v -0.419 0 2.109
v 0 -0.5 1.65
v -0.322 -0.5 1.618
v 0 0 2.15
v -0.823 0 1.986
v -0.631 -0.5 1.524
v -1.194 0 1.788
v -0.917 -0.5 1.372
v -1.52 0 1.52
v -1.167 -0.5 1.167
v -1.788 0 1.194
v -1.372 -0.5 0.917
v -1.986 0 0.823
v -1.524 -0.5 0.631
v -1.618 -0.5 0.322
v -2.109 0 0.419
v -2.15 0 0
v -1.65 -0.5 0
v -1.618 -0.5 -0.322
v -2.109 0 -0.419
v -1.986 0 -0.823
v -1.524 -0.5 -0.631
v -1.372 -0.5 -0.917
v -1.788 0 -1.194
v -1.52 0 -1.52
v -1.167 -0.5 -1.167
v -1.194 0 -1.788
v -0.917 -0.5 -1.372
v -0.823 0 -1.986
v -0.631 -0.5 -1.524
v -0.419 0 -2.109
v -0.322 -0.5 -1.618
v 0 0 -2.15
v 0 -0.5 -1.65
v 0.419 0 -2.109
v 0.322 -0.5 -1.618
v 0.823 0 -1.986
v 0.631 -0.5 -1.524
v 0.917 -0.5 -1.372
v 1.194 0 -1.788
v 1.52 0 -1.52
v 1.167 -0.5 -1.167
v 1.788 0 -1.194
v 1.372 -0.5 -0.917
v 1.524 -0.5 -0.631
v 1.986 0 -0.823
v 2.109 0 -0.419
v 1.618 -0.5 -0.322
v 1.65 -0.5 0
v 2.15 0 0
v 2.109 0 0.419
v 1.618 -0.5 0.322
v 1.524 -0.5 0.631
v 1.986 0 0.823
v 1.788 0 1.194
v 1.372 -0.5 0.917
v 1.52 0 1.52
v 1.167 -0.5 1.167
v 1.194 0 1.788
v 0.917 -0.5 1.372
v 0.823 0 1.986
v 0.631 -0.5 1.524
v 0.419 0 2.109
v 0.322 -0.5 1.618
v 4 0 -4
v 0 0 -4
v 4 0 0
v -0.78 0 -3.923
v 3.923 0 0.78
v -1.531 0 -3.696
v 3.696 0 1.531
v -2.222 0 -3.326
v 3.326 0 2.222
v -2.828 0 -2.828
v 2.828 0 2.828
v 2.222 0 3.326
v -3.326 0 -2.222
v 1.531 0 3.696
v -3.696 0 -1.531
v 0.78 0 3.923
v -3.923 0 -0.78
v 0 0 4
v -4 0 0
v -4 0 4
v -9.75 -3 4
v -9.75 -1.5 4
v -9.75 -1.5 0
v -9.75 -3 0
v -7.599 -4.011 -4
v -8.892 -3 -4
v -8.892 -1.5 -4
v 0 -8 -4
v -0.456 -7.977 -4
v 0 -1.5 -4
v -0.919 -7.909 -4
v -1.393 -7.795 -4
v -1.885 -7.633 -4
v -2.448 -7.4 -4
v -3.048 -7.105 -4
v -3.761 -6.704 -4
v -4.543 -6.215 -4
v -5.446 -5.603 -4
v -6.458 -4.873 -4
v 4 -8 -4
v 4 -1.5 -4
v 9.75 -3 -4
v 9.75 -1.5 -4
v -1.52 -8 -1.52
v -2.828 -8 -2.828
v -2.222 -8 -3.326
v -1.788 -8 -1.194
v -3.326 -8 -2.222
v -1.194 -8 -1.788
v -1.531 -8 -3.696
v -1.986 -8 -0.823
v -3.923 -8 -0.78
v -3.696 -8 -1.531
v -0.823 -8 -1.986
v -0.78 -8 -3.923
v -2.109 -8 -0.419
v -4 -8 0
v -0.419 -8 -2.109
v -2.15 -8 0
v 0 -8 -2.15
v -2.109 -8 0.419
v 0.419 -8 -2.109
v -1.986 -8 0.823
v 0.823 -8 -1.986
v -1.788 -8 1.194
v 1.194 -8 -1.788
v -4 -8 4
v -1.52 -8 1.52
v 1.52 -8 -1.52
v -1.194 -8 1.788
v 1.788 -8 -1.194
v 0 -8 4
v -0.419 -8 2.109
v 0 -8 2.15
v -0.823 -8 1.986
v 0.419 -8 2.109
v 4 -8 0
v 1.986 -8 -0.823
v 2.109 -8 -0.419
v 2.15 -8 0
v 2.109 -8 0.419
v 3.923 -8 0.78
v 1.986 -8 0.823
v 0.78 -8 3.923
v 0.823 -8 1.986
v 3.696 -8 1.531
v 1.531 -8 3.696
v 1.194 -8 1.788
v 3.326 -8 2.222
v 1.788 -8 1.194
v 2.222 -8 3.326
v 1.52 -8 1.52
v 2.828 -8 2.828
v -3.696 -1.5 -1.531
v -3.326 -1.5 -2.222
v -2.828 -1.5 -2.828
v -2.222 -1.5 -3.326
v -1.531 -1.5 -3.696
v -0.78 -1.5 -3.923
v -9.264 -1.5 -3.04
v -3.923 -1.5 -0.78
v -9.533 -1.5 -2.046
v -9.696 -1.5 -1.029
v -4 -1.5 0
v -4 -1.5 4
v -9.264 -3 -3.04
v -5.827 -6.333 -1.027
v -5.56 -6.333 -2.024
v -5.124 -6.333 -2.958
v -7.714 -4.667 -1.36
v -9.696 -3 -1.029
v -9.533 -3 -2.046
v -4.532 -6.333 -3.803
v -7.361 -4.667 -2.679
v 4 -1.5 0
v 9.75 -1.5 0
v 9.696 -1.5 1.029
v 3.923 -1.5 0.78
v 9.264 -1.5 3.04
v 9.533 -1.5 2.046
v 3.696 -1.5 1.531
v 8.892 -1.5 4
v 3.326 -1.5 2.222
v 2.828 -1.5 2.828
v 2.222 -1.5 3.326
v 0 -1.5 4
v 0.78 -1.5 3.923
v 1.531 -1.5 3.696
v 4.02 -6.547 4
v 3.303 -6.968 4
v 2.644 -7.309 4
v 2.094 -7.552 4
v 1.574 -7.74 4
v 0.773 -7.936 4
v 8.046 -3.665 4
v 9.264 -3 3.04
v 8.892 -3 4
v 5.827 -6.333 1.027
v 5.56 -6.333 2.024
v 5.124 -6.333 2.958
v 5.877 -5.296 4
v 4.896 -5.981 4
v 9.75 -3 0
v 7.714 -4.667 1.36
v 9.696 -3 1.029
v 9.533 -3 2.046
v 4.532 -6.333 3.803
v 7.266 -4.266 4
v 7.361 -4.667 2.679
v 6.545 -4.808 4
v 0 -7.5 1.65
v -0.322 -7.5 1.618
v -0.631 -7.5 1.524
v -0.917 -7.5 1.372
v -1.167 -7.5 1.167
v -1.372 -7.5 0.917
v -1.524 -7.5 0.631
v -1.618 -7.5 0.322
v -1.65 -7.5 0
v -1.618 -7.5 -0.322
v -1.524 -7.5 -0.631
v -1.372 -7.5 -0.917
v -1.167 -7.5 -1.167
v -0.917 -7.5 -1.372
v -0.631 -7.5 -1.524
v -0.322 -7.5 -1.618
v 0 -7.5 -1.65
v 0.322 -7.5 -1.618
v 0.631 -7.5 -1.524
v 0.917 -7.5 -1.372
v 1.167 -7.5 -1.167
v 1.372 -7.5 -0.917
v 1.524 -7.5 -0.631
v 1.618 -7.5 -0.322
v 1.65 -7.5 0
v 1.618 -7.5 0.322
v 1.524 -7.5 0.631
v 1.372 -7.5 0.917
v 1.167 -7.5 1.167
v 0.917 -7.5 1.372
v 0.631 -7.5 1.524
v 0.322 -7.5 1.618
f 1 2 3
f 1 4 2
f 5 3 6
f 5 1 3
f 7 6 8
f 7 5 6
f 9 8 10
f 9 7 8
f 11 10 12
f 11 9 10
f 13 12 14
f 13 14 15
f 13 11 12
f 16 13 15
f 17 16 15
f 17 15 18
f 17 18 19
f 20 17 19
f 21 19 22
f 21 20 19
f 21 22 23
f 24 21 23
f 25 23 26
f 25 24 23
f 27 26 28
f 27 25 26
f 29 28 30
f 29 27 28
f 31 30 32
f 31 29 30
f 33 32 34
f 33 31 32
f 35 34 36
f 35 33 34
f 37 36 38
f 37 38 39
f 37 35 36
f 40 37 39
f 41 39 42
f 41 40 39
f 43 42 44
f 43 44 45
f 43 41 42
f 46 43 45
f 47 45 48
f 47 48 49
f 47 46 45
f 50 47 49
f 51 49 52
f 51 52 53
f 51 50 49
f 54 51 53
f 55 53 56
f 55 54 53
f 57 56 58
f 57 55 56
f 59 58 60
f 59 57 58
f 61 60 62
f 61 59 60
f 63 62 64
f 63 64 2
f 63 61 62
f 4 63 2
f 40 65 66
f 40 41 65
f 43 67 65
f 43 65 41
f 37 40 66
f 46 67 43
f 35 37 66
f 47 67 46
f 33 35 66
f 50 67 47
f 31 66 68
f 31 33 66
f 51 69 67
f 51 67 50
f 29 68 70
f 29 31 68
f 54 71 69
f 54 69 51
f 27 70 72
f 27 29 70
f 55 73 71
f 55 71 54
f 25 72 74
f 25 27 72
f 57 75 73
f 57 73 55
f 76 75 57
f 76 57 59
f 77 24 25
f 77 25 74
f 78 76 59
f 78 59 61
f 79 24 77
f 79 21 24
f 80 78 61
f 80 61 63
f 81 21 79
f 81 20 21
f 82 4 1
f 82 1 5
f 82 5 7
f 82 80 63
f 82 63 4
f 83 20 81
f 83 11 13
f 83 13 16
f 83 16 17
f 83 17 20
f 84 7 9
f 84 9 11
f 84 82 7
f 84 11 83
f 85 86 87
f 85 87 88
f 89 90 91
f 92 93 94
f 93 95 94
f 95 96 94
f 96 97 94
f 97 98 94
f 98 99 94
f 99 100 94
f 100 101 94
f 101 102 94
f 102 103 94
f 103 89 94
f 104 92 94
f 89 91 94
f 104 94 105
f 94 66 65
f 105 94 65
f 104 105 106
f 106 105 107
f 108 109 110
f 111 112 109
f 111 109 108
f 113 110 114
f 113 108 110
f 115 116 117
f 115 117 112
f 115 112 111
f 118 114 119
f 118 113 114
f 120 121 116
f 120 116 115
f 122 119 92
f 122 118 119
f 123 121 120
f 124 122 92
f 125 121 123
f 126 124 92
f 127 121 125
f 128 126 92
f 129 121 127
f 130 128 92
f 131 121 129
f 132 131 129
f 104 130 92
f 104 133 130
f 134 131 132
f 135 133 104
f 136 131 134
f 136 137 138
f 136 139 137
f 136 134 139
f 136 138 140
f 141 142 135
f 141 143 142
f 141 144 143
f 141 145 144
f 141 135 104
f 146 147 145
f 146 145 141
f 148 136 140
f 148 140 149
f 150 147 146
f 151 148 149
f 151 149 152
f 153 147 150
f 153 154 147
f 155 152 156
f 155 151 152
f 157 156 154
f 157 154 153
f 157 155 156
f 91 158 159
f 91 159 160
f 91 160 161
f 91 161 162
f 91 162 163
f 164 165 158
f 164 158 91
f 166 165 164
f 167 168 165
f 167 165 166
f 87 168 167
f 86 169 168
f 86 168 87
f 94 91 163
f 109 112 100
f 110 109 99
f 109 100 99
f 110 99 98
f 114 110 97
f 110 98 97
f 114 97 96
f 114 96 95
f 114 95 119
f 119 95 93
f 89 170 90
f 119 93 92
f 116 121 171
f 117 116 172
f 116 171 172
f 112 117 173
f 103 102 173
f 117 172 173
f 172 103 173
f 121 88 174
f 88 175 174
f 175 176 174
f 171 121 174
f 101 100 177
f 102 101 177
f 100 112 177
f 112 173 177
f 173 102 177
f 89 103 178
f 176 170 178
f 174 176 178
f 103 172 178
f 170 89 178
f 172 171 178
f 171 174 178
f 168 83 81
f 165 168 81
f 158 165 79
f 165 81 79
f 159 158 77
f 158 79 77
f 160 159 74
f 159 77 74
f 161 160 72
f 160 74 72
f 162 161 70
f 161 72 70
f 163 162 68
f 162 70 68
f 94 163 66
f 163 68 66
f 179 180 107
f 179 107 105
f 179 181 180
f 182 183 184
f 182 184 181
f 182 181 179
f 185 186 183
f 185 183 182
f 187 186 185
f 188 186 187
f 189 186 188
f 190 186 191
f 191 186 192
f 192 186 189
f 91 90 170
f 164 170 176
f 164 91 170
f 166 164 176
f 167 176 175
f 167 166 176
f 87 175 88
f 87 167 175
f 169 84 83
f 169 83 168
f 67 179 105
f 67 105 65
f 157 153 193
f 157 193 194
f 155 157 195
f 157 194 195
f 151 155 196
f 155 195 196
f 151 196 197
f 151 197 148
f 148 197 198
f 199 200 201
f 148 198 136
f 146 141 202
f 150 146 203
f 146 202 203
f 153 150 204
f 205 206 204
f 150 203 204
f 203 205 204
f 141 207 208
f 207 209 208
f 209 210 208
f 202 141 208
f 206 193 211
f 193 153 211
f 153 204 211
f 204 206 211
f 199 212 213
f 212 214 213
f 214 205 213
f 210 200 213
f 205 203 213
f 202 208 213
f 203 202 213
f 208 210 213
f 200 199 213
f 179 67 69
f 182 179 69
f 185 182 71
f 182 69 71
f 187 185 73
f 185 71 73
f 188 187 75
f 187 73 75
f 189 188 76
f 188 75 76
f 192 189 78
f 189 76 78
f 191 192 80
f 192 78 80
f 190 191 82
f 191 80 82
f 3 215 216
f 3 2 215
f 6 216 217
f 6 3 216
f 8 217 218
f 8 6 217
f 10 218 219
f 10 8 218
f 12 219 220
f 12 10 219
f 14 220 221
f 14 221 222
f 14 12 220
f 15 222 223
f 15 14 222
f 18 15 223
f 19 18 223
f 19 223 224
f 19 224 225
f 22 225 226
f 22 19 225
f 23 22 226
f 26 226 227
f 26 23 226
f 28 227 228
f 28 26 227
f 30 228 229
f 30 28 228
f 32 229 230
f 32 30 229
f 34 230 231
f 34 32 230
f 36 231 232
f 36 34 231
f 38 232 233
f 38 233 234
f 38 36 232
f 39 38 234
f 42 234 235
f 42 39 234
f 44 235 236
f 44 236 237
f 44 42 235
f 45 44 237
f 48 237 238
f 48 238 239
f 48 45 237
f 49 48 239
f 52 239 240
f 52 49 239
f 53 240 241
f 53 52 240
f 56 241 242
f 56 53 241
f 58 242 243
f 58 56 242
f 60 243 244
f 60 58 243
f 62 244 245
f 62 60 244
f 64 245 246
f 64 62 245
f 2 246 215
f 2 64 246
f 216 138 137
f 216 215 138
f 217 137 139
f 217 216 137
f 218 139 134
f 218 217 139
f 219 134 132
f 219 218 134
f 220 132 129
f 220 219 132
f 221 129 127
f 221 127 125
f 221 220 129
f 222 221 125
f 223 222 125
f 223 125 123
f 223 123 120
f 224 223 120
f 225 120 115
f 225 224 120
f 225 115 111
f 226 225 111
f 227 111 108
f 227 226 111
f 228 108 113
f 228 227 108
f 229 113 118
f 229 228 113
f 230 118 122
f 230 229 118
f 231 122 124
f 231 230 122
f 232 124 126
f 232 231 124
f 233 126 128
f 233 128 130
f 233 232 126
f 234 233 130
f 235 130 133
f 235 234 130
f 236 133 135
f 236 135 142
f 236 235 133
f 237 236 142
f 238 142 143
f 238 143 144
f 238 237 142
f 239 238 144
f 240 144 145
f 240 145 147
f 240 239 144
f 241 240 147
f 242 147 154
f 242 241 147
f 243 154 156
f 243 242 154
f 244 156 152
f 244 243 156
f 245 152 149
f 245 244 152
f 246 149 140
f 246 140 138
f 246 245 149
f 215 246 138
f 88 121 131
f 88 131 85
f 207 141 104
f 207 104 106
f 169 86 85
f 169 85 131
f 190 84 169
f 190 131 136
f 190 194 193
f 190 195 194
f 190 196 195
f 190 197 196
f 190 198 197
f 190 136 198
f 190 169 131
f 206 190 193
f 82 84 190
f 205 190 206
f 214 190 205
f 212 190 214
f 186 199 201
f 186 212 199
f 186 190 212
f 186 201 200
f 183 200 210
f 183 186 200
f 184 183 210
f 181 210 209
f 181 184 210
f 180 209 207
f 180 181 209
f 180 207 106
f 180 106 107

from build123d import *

# Parameters (mm, degrees)
EXTRUDE_1_DEPTH     = 4
CUT_EXTRUDE_1_DEPTH = 1.5
CUT_EXTRUDE_2_DEPTH = 7.5


with BuildPart() as part:
    # Эскиз1 → Бобышка-Вытянуть1 (new body, symmetric)
    with BuildSketch(Plane.XY):
        Polygon((4, 0), (-4, 0), (-4, -1.5), (-9.75, -1.5), (-9.75, -8), (9.75, -8), (9.75, -1.5), (4, -1.5), align=None)
    extrude(amount=EXTRUDE_1_DEPTH, both=True)

    # Эскиз3 → Отверстие обработанное метчиком M43 (revolve, cut)
    with BuildSketch(Plane(origin=(0, 0, 0), x_dir=(0, 0, 1), z_dir=(1, 0, 0))):
        Polygon((0, 0), (0, 8), (2.15, 8), (1.65, 7.5), (1.65, 0.5), (2.15, 0), align=None)
    revolve(axis=Axis((0, 6.35, 0), (0, -1, 0)), mode=Mode.SUBTRACT)

    # Эскиз4 → Вырез-Вытянуть1 (cut)
    with BuildSketch(Plane(origin=(0, 0, 0), x_dir=(1, 0, 0), z_dir=(0, 1, 0))):
        with BuildLine():
            Line((-4, 4), (-4, 0))
            ThreePointArc((-4, 0), (-2.828427125, 2.828427125), (0, 4))
            Line((0, 4), (-4, 4))
        make_face()
        with BuildLine():
            Line((0, -4), (4, -4))
            Line((4, -4), (4, 0))
            ThreePointArc((4, 0), (2.828427125, -2.828427125), (0, -4))
        make_face()
    extrude(amount=-CUT_EXTRUDE_1_DEPTH, mode=Mode.SUBTRACT)

    # Эскиз5 → Вырез-Вытянуть2 (cut, through all)
    with BuildSketch(Plane(origin=(0, -1.5, 0), x_dir=(1, 0, 0), z_dir=(0, 1, 0))):
        with BuildLine():
            Line((-9.75, 0), (-9.75, 4))
            Line((-9.75, 4), (-8.891709622, 4))
            ThreePointArc((-8.891709622, 4), (-9.533012871, 2.045523305), (-9.75, 0))
        make_face()
        with BuildLine():
            Line((9.75, 0), (9.75, -4))
            Line((9.75, -4), (8.891709622, -4))
            ThreePointArc((8.891709622, -4), (9.533012871, -2.045523305), (9.75, 0))
        make_face()
    extrude(amount=-CUT_EXTRUDE_2_DEPTH, mode=Mode.SUBTRACT)

    # Вырез-По траектории1: sweep along a path in Эскиз7
    with BuildLine(Plane.XZ.offset(8)) as sweep_1_path:
        Line((0, 9.75), (-9.75, 9.75))
        Line((-9.75, 9.75), (-9.75, 0))
        ThreePointArc((-9.75, 0), (-6.894291117, -6.894291117), (0, -9.75))
        Line((0, -9.75), (9.75, -9.75))
        Line((9.75, -9.75), (9.75, 0))
        ThreePointArc((9.75, 0), (6.894291117, 6.894291117), (0, 9.75))
    # Эскиз6 → Вырез-По траектории1 (sweep, cut)
    with BuildSketch(Plane.XY.offset(4)):
        Polygon((-9.75, -3), (-9.75, -8), (-4, -8), align=None)
    sweep(path=sweep_1_path.line, transition=Transition.RIGHT, mode=Mode.SUBTRACT)


solid = part.part
